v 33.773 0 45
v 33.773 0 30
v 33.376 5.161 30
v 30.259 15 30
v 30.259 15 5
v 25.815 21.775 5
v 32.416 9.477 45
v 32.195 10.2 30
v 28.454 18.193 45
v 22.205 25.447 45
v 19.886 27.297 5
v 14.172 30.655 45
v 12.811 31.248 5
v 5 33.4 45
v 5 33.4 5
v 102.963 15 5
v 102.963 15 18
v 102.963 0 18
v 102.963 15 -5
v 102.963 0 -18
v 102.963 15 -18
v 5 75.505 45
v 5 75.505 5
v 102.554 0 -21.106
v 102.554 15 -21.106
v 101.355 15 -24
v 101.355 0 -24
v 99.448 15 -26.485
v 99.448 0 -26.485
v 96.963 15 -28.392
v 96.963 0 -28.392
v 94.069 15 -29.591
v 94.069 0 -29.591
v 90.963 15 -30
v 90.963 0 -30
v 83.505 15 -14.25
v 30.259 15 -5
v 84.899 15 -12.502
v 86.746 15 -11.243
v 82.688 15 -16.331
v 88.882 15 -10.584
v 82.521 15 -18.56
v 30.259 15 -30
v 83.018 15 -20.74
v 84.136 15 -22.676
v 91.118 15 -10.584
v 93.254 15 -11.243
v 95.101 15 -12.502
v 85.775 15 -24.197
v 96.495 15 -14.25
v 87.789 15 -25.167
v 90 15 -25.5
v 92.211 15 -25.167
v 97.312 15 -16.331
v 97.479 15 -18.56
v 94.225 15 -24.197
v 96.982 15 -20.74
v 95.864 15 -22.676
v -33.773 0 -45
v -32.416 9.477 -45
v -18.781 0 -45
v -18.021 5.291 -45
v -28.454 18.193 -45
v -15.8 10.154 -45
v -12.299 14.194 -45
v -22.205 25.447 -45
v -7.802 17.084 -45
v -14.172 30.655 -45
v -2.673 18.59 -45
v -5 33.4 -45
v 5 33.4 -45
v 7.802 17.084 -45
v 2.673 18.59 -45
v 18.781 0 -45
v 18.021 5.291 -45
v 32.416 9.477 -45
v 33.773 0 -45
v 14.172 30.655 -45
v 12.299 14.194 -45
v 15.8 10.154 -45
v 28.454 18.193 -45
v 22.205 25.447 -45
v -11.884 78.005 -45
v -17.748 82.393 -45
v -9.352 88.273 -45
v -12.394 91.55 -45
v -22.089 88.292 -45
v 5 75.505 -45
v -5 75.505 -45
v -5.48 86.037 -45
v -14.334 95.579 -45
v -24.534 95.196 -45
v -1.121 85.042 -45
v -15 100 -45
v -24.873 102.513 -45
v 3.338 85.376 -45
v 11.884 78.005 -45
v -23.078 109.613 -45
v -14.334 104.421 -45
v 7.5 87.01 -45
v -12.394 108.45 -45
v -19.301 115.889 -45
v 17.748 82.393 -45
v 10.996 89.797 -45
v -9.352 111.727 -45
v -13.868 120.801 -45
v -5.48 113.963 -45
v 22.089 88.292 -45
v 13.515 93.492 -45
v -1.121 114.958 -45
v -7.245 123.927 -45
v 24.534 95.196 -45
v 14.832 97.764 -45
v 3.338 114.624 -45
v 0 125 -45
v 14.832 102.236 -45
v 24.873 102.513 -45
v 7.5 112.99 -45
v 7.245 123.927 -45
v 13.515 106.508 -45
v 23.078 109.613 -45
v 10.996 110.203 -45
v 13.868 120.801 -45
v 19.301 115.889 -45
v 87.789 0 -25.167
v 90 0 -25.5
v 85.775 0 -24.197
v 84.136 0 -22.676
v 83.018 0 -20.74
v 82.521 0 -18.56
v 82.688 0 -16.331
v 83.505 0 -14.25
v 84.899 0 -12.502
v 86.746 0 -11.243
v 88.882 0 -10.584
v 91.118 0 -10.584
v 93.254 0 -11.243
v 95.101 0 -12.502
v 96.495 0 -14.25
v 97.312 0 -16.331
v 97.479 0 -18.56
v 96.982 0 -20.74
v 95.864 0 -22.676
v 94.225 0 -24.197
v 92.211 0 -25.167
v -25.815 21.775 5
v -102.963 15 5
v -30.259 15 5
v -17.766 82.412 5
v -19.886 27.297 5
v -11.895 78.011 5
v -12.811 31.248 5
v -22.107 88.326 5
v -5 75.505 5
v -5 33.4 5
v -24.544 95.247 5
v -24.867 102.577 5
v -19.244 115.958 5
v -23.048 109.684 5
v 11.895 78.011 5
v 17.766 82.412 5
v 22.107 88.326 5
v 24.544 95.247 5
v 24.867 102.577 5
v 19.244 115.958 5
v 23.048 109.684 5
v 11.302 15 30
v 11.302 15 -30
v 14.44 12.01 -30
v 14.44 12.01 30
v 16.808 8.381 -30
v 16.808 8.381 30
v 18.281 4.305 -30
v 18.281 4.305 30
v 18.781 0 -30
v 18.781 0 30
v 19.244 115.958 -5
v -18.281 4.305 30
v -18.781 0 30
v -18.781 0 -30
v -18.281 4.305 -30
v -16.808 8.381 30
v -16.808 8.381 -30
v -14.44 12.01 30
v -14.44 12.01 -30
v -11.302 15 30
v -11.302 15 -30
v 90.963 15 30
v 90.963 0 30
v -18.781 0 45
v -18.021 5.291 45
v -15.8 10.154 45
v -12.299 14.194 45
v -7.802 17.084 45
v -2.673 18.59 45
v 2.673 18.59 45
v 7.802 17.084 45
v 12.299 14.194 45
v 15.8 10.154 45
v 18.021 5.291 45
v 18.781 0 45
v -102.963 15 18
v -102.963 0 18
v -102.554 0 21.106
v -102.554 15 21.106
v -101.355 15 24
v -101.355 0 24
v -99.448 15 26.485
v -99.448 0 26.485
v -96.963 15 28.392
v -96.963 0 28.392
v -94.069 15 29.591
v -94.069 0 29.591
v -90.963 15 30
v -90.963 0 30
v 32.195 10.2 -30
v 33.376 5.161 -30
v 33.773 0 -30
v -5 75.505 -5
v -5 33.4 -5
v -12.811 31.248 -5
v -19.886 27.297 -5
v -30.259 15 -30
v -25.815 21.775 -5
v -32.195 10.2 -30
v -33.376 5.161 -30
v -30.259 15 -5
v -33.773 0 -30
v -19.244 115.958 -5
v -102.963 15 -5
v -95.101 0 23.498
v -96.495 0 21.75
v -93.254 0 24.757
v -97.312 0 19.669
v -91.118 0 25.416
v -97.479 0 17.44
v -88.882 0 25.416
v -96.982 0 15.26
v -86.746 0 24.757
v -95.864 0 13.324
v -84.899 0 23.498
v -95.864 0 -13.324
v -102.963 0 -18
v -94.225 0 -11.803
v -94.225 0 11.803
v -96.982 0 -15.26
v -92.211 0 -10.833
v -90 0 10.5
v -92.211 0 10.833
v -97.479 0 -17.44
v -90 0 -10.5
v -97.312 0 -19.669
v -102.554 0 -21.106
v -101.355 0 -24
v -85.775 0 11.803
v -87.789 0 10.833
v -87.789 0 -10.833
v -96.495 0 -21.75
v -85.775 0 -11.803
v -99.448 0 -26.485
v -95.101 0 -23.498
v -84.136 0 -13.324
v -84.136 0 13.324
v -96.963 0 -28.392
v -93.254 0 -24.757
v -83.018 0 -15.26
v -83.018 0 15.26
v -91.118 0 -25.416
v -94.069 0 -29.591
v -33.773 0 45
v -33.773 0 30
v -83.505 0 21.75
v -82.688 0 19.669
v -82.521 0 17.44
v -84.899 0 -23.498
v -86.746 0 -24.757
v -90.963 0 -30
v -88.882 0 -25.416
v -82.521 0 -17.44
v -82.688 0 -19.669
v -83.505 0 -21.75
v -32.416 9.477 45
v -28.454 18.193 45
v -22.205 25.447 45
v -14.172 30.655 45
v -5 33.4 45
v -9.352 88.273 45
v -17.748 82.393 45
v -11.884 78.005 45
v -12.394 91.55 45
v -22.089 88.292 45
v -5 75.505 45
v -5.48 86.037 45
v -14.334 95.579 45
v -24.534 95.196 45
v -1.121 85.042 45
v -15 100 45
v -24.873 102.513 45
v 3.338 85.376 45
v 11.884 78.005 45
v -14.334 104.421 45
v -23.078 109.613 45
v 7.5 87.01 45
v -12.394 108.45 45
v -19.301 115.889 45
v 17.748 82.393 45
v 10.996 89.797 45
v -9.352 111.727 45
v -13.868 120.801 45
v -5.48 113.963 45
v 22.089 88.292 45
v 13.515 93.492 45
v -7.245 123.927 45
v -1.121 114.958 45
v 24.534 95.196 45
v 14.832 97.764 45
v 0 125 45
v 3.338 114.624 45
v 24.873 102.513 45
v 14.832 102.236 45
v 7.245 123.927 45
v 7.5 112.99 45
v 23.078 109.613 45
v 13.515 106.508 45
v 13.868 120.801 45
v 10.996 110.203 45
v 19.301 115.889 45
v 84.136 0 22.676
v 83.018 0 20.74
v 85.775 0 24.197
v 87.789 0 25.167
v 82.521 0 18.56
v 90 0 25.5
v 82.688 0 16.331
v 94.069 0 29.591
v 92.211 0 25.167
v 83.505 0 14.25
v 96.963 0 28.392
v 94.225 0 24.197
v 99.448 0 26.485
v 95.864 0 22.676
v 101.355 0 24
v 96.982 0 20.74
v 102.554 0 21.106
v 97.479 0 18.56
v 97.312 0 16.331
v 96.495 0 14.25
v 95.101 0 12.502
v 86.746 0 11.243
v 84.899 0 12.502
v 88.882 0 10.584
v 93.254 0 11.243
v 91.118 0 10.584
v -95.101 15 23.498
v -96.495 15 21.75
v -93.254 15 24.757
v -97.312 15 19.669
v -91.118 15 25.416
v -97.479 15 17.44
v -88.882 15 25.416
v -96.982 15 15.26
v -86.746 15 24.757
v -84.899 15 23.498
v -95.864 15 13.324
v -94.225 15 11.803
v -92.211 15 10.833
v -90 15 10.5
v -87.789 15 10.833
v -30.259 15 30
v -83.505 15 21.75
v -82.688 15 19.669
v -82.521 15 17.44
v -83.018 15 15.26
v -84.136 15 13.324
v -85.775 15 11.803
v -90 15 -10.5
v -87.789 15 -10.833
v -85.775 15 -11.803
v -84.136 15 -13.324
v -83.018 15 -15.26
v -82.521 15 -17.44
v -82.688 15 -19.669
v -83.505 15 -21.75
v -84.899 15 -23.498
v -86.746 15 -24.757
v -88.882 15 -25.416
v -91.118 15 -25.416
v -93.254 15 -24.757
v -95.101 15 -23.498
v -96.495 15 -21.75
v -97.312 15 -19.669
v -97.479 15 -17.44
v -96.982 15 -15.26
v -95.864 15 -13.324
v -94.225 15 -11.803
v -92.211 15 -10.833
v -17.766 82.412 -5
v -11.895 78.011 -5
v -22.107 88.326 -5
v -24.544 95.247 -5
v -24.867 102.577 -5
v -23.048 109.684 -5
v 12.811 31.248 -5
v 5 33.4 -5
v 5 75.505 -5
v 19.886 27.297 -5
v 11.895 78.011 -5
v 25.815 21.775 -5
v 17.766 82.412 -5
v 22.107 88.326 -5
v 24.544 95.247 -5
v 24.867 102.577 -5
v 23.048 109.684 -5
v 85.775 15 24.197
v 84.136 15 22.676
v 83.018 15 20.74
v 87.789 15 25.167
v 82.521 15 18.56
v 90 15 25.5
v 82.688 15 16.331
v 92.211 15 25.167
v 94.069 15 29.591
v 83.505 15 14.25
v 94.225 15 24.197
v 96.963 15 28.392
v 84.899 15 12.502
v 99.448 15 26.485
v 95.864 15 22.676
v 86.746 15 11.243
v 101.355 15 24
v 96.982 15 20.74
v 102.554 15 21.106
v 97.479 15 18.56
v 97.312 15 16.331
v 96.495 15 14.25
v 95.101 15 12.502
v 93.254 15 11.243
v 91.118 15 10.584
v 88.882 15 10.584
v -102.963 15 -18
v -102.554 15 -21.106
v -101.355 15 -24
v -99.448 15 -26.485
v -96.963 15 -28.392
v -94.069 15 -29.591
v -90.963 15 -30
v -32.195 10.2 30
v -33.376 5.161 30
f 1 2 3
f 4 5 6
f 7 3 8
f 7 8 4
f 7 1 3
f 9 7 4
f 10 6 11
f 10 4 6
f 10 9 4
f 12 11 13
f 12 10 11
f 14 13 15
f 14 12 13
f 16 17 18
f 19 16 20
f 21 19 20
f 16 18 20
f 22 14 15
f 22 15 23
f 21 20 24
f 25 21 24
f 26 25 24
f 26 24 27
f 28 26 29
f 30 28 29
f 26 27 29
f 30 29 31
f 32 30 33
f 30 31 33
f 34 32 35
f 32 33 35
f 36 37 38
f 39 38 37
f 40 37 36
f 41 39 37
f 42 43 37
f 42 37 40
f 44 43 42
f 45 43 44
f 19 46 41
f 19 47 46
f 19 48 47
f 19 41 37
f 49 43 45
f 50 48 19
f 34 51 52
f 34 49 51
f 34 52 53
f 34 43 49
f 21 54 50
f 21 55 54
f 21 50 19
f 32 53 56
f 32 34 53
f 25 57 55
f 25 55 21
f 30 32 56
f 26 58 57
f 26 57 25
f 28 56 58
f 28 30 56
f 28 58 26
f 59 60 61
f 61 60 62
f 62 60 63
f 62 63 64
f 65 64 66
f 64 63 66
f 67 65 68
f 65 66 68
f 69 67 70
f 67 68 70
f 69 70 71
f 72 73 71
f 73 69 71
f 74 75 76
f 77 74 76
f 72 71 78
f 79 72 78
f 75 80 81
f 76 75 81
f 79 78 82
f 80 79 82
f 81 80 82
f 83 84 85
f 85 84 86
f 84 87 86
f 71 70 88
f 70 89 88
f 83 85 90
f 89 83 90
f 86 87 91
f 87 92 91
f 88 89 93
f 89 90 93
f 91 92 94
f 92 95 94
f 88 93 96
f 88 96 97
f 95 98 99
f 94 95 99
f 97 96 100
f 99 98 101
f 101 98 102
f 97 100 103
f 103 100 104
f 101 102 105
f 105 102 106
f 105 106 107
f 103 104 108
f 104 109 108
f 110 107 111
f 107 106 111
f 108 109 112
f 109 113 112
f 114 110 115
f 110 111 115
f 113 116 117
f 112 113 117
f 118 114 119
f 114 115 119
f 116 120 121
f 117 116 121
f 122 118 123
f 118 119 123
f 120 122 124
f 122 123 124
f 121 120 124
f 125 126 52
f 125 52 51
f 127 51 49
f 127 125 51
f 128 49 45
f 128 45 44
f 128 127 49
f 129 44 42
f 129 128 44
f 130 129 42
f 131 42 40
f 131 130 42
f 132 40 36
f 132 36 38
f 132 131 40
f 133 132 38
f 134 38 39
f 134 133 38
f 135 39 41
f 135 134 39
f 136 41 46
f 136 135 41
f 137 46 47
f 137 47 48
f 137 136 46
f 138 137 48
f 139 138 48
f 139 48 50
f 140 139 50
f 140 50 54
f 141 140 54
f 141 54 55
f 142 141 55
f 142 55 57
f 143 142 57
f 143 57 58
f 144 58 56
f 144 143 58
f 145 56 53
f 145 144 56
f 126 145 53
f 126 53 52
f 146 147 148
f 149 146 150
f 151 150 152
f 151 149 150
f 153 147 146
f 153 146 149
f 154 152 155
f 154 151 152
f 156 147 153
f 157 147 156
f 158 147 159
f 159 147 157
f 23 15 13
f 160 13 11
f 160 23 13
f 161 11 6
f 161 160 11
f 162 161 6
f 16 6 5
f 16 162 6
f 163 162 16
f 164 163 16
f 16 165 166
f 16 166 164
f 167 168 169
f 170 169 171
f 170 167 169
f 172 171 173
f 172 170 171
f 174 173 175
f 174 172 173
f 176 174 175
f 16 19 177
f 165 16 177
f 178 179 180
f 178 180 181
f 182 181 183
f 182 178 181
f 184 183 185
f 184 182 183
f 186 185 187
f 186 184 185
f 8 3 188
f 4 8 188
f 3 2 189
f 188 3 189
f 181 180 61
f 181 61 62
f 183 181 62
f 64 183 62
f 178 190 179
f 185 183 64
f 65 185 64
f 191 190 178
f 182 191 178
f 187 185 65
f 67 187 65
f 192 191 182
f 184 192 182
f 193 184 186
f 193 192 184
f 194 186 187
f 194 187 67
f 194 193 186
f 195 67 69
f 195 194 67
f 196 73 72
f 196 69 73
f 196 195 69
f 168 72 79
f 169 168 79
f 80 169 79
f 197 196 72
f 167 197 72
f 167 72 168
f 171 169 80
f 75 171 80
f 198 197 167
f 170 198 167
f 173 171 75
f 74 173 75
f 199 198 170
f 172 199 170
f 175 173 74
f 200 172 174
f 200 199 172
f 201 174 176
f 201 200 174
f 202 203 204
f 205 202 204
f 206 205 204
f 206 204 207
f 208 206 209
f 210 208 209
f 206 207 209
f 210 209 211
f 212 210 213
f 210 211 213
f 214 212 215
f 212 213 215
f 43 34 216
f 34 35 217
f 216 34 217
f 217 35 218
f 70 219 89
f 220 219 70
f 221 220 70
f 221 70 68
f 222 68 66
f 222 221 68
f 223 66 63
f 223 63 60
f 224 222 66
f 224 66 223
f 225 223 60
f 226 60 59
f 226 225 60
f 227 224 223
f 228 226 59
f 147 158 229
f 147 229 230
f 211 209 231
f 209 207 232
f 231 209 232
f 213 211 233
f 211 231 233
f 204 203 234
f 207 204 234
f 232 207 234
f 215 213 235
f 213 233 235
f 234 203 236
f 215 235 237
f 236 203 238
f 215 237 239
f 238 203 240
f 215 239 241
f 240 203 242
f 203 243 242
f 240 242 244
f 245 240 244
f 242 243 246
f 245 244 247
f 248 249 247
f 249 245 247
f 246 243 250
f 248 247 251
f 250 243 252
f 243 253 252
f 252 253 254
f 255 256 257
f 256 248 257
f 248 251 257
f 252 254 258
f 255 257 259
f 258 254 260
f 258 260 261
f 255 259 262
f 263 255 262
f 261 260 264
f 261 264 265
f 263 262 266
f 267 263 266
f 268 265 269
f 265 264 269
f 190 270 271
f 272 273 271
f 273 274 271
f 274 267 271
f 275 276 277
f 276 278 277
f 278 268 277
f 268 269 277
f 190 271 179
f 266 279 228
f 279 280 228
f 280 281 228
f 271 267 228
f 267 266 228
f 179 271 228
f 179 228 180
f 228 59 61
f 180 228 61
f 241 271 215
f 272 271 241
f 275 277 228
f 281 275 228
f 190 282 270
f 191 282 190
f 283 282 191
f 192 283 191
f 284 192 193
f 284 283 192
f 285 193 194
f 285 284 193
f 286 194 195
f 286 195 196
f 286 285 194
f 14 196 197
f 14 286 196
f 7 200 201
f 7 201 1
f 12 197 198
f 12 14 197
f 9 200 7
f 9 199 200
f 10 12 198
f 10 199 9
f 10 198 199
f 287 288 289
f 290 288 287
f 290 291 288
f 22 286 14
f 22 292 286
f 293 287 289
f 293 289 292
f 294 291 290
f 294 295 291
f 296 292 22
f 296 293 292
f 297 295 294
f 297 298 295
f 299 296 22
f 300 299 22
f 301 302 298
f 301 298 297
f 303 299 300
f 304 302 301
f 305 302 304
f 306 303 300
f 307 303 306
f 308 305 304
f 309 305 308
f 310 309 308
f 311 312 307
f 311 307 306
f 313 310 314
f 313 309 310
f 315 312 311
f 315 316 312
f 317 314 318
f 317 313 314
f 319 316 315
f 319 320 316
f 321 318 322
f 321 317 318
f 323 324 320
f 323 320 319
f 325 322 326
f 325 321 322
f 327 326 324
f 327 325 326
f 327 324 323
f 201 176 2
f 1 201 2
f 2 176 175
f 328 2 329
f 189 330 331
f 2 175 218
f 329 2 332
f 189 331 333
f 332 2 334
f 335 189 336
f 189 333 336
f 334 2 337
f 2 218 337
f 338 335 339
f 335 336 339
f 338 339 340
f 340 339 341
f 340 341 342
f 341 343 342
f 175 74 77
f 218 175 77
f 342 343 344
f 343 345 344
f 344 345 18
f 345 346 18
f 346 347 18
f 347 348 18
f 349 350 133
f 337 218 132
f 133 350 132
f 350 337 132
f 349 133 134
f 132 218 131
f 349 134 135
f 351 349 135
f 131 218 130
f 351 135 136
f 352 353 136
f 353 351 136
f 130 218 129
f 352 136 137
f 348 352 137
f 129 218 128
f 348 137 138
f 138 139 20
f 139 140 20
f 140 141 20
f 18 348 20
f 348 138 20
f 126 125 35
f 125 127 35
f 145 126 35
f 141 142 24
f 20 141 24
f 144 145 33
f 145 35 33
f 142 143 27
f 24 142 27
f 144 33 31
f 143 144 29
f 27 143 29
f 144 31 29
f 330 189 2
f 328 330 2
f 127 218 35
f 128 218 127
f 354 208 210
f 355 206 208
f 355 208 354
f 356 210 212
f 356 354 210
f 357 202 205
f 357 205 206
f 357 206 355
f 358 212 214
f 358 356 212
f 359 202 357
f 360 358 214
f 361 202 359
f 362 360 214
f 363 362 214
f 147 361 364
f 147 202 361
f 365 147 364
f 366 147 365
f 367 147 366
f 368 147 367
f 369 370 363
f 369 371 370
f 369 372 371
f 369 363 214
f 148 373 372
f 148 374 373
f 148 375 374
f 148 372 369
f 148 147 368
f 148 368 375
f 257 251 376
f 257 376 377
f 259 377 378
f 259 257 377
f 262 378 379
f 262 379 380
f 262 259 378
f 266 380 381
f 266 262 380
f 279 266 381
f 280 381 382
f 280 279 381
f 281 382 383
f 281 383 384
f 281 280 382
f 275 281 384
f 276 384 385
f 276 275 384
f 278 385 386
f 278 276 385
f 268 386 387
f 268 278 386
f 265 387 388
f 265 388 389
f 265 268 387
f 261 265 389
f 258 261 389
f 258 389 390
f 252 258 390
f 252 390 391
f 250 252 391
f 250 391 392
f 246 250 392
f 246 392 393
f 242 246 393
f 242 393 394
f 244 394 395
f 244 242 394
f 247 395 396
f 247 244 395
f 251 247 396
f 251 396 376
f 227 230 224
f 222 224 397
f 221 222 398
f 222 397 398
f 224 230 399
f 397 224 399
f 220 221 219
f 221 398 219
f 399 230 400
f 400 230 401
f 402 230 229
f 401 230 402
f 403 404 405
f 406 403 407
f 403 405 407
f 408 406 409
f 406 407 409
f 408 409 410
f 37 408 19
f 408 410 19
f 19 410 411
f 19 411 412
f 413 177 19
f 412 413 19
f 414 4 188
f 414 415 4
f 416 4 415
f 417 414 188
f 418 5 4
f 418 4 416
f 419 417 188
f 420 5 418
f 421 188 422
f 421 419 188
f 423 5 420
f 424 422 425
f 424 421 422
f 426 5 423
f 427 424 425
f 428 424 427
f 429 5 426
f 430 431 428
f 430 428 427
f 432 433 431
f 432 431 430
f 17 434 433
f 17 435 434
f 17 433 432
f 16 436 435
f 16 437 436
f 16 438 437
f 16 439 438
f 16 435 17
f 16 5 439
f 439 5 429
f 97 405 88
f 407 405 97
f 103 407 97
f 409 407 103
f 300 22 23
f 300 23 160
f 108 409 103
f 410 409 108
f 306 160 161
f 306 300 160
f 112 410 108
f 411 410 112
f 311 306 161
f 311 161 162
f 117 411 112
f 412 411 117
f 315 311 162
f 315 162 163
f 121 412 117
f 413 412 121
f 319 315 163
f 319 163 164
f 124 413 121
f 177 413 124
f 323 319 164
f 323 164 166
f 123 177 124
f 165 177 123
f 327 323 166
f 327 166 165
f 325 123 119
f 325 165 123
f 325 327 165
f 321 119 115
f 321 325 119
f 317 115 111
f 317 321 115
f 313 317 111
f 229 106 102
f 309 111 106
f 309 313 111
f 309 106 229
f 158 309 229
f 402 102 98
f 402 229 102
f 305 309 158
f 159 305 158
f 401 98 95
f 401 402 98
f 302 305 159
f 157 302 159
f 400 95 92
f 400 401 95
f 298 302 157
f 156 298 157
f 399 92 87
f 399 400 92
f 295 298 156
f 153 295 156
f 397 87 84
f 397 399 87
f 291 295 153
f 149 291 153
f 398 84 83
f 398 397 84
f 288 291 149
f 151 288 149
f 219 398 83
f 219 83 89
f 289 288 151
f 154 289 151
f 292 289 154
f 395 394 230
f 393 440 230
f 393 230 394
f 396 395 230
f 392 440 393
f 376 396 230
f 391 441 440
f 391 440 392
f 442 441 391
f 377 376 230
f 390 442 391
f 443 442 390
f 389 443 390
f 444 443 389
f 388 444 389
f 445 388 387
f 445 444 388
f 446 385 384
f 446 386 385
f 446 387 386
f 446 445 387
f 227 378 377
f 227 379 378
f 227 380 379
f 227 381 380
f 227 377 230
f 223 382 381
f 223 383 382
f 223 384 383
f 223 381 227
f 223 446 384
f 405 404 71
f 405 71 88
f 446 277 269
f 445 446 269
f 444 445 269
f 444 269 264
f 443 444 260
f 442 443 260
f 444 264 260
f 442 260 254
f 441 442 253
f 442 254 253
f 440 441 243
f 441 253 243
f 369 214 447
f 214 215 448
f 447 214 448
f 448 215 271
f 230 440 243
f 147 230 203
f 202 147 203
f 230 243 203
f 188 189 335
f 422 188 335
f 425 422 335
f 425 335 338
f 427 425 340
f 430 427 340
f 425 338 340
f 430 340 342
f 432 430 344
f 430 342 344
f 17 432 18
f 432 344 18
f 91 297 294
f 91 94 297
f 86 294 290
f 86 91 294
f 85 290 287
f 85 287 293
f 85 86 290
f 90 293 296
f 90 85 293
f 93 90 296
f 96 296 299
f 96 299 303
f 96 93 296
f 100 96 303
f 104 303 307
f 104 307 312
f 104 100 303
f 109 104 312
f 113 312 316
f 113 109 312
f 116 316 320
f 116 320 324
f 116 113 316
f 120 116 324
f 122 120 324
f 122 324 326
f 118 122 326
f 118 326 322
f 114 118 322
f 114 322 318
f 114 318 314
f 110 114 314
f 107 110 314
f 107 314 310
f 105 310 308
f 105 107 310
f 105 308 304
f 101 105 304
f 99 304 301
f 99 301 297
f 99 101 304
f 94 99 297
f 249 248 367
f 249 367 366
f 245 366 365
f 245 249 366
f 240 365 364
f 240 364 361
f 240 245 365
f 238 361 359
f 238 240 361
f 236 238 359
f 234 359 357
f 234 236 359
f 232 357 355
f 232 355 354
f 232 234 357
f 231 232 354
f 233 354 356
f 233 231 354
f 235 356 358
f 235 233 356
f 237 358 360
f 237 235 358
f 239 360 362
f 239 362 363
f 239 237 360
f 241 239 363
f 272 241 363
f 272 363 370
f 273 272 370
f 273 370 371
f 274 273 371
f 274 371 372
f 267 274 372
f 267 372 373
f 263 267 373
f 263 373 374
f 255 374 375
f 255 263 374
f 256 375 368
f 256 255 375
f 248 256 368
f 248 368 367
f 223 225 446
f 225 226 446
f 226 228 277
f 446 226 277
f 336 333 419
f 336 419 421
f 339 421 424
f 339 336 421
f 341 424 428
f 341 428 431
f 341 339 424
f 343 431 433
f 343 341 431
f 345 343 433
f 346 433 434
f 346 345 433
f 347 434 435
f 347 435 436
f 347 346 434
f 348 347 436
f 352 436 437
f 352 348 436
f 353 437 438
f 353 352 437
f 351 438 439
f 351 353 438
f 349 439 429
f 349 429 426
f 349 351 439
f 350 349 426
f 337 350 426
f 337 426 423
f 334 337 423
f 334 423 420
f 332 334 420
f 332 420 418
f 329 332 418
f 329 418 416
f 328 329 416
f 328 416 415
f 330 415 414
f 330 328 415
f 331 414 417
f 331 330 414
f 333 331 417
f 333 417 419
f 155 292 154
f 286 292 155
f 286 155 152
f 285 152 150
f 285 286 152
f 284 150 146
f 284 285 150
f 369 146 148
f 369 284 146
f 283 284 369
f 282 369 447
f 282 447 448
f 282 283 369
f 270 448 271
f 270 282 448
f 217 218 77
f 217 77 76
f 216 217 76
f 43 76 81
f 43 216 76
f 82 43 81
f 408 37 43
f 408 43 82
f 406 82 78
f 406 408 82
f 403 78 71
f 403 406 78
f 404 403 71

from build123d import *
from build123d.topology import SkipClean

# Parameters (mm, degrees)
SKETCH1_R           = 15
BOSS_EXTRUDE1_DEPTH = 45
SKETCH4_R           = 7.5
BOSS_EXTRUDE2_DEPTH = 15
CUT_EXTRUDE1_DEPTH  = 179.469413089
BOSS_EXTRUDE3_DEPTH = 5


with BuildPart() as part:
    # Sketch1 → Boss-Extrude1 (new, symmetric)
    with BuildSketch(Plane.XY):
        with BuildLine():
            ThreePointArc((-5, 33.400370285), (-25.587569792, 22.042255042), (-33.772544103, 0))
            Line((-33.772544103, 0), (-18.781429719, 0))
            ThreePointArc((-18.781429719, 0), (0, 18.781429719), (18.781429719, 0))
            Line((18.781429719, 0), (33.772544103, 0))
            ThreePointArc((33.772544103, 0), (25.587569792, 22.042255042), (5, 33.400370285))
            Line((5, 33.400370285), (5, 75.505102572))
            ThreePointArc((5, 75.505102572), (0, 125), (-5, 75.505102572))
            Line((-5, 75.505102572), (-5, 33.400370285))
        make_face()
        with Locations((0, 100)):
            Circle(SKETCH1_R, mode=Mode.SUBTRACT)
    extrude(amount=BOSS_EXTRUDE1_DEPTH, both=True)

    # Sketch4 → Boss-Extrude2 (add)
    with BuildSketch(Plane(origin=(0, 0, 0), x_dir=(1, 0, 0), z_dir=(0, 1, 0))):
        with BuildLine():
            Line((-90.962767097, -30), (90.962767097, -30))
            ThreePointArc((90.962767097, -30), (99.448048472, -26.485281374), (102.962767097, -18))
            Line((102.962767097, -18), (102.962767097, 18))
            ThreePointArc((102.962767097, 18), (99.448048472, 26.485281374), (90.962767097, 30))
            Line((90.962767097, 30), (-90.962767097, 30))
            ThreePointArc((-90.962767097, 30), (-99.448048472, 26.485281374), (-102.962767097, 18))
            Line((-102.962767097, 18), (-102.962767097, -18))
            ThreePointArc((-102.962767097, -18), (-99.448048472, -26.485281374), (-90.962767097, -30))
        make_face()
        with Locations((-90, 18)):
            Circle(SKETCH4_R, mode=Mode.SUBTRACT)
        with Locations((90, 18)):
            Circle(SKETCH4_R, mode=Mode.SUBTRACT)
        with Locations((90, -18)):
            Circle(SKETCH4_R, mode=Mode.SUBTRACT)
        with Locations((-90, -18)):
            Circle(SKETCH4_R, mode=Mode.SUBTRACT)
    extrude(amount=BOSS_EXTRUDE2_DEPTH)

    # Sketch5 → Cut-Extrude1 (cut, through all)
    with SkipClean():  # the faces are left unmerged after this step: merging them gives an invalid solid
        with BuildSketch(Plane.XY.offset(30)):
            with BuildLine():
                Line((-18.781429719, 0), (18.781429719, 0))
                ThreePointArc((18.781429719, 0), (16.807967644, 8.380592221), (11.302305177, 15))
                Line((11.302305177, 15), (-11.302305177, 15))
                ThreePointArc((-11.302305177, 15), (-16.807967644, 8.380592221), (-18.781429719, 0))
            make_face()
        extrude(amount=-CUT_EXTRUDE1_DEPTH, mode=Mode.SUBTRACT)
    add(part.part.scale(1), mode=Mode.REPLACE)  # the faces are merged on a copy

    # Sketch6 → Boss-Extrude3 (add, symmetric)
    with SkipClean():  # the faces are left unmerged after this step: merging them gives an invalid solid
        with BuildSketch(Plane.XY):
            with BuildLine():
                ThreePointArc((-5, 75.505102572), (-23.580846559, 91.696767162), (-19.244209313, 115.95808284))
                Line((-19.244209313, 115.95808284), (-102.962767097, 15))
                Line((-102.962767097, 15), (-30.258630755, 15))
                ThreePointArc((-30.258630755, 15), (-19.885576867, 27.297409545), (-5, 33.400370285))
                Line((-5, 33.400370285), (-5, 75.505102572))
            make_face()
            with BuildLine():
                Line((102.962767097, 15), (19.244209313, 115.95808284))
                ThreePointArc((19.244209313, 115.95808284), (23.580846559, 91.696767162), (5, 75.505102572))
                Line((5, 75.505102572), (5, 33.400370285))
                ThreePointArc((5, 33.400370285), (19.885576867, 27.297409545), (30.258630755, 15))
                Line((30.258630755, 15), (102.962767097, 15))
            make_face()
        extrude(amount=BOSS_EXTRUDE3_DEPTH, both=True)


solid = part.part
